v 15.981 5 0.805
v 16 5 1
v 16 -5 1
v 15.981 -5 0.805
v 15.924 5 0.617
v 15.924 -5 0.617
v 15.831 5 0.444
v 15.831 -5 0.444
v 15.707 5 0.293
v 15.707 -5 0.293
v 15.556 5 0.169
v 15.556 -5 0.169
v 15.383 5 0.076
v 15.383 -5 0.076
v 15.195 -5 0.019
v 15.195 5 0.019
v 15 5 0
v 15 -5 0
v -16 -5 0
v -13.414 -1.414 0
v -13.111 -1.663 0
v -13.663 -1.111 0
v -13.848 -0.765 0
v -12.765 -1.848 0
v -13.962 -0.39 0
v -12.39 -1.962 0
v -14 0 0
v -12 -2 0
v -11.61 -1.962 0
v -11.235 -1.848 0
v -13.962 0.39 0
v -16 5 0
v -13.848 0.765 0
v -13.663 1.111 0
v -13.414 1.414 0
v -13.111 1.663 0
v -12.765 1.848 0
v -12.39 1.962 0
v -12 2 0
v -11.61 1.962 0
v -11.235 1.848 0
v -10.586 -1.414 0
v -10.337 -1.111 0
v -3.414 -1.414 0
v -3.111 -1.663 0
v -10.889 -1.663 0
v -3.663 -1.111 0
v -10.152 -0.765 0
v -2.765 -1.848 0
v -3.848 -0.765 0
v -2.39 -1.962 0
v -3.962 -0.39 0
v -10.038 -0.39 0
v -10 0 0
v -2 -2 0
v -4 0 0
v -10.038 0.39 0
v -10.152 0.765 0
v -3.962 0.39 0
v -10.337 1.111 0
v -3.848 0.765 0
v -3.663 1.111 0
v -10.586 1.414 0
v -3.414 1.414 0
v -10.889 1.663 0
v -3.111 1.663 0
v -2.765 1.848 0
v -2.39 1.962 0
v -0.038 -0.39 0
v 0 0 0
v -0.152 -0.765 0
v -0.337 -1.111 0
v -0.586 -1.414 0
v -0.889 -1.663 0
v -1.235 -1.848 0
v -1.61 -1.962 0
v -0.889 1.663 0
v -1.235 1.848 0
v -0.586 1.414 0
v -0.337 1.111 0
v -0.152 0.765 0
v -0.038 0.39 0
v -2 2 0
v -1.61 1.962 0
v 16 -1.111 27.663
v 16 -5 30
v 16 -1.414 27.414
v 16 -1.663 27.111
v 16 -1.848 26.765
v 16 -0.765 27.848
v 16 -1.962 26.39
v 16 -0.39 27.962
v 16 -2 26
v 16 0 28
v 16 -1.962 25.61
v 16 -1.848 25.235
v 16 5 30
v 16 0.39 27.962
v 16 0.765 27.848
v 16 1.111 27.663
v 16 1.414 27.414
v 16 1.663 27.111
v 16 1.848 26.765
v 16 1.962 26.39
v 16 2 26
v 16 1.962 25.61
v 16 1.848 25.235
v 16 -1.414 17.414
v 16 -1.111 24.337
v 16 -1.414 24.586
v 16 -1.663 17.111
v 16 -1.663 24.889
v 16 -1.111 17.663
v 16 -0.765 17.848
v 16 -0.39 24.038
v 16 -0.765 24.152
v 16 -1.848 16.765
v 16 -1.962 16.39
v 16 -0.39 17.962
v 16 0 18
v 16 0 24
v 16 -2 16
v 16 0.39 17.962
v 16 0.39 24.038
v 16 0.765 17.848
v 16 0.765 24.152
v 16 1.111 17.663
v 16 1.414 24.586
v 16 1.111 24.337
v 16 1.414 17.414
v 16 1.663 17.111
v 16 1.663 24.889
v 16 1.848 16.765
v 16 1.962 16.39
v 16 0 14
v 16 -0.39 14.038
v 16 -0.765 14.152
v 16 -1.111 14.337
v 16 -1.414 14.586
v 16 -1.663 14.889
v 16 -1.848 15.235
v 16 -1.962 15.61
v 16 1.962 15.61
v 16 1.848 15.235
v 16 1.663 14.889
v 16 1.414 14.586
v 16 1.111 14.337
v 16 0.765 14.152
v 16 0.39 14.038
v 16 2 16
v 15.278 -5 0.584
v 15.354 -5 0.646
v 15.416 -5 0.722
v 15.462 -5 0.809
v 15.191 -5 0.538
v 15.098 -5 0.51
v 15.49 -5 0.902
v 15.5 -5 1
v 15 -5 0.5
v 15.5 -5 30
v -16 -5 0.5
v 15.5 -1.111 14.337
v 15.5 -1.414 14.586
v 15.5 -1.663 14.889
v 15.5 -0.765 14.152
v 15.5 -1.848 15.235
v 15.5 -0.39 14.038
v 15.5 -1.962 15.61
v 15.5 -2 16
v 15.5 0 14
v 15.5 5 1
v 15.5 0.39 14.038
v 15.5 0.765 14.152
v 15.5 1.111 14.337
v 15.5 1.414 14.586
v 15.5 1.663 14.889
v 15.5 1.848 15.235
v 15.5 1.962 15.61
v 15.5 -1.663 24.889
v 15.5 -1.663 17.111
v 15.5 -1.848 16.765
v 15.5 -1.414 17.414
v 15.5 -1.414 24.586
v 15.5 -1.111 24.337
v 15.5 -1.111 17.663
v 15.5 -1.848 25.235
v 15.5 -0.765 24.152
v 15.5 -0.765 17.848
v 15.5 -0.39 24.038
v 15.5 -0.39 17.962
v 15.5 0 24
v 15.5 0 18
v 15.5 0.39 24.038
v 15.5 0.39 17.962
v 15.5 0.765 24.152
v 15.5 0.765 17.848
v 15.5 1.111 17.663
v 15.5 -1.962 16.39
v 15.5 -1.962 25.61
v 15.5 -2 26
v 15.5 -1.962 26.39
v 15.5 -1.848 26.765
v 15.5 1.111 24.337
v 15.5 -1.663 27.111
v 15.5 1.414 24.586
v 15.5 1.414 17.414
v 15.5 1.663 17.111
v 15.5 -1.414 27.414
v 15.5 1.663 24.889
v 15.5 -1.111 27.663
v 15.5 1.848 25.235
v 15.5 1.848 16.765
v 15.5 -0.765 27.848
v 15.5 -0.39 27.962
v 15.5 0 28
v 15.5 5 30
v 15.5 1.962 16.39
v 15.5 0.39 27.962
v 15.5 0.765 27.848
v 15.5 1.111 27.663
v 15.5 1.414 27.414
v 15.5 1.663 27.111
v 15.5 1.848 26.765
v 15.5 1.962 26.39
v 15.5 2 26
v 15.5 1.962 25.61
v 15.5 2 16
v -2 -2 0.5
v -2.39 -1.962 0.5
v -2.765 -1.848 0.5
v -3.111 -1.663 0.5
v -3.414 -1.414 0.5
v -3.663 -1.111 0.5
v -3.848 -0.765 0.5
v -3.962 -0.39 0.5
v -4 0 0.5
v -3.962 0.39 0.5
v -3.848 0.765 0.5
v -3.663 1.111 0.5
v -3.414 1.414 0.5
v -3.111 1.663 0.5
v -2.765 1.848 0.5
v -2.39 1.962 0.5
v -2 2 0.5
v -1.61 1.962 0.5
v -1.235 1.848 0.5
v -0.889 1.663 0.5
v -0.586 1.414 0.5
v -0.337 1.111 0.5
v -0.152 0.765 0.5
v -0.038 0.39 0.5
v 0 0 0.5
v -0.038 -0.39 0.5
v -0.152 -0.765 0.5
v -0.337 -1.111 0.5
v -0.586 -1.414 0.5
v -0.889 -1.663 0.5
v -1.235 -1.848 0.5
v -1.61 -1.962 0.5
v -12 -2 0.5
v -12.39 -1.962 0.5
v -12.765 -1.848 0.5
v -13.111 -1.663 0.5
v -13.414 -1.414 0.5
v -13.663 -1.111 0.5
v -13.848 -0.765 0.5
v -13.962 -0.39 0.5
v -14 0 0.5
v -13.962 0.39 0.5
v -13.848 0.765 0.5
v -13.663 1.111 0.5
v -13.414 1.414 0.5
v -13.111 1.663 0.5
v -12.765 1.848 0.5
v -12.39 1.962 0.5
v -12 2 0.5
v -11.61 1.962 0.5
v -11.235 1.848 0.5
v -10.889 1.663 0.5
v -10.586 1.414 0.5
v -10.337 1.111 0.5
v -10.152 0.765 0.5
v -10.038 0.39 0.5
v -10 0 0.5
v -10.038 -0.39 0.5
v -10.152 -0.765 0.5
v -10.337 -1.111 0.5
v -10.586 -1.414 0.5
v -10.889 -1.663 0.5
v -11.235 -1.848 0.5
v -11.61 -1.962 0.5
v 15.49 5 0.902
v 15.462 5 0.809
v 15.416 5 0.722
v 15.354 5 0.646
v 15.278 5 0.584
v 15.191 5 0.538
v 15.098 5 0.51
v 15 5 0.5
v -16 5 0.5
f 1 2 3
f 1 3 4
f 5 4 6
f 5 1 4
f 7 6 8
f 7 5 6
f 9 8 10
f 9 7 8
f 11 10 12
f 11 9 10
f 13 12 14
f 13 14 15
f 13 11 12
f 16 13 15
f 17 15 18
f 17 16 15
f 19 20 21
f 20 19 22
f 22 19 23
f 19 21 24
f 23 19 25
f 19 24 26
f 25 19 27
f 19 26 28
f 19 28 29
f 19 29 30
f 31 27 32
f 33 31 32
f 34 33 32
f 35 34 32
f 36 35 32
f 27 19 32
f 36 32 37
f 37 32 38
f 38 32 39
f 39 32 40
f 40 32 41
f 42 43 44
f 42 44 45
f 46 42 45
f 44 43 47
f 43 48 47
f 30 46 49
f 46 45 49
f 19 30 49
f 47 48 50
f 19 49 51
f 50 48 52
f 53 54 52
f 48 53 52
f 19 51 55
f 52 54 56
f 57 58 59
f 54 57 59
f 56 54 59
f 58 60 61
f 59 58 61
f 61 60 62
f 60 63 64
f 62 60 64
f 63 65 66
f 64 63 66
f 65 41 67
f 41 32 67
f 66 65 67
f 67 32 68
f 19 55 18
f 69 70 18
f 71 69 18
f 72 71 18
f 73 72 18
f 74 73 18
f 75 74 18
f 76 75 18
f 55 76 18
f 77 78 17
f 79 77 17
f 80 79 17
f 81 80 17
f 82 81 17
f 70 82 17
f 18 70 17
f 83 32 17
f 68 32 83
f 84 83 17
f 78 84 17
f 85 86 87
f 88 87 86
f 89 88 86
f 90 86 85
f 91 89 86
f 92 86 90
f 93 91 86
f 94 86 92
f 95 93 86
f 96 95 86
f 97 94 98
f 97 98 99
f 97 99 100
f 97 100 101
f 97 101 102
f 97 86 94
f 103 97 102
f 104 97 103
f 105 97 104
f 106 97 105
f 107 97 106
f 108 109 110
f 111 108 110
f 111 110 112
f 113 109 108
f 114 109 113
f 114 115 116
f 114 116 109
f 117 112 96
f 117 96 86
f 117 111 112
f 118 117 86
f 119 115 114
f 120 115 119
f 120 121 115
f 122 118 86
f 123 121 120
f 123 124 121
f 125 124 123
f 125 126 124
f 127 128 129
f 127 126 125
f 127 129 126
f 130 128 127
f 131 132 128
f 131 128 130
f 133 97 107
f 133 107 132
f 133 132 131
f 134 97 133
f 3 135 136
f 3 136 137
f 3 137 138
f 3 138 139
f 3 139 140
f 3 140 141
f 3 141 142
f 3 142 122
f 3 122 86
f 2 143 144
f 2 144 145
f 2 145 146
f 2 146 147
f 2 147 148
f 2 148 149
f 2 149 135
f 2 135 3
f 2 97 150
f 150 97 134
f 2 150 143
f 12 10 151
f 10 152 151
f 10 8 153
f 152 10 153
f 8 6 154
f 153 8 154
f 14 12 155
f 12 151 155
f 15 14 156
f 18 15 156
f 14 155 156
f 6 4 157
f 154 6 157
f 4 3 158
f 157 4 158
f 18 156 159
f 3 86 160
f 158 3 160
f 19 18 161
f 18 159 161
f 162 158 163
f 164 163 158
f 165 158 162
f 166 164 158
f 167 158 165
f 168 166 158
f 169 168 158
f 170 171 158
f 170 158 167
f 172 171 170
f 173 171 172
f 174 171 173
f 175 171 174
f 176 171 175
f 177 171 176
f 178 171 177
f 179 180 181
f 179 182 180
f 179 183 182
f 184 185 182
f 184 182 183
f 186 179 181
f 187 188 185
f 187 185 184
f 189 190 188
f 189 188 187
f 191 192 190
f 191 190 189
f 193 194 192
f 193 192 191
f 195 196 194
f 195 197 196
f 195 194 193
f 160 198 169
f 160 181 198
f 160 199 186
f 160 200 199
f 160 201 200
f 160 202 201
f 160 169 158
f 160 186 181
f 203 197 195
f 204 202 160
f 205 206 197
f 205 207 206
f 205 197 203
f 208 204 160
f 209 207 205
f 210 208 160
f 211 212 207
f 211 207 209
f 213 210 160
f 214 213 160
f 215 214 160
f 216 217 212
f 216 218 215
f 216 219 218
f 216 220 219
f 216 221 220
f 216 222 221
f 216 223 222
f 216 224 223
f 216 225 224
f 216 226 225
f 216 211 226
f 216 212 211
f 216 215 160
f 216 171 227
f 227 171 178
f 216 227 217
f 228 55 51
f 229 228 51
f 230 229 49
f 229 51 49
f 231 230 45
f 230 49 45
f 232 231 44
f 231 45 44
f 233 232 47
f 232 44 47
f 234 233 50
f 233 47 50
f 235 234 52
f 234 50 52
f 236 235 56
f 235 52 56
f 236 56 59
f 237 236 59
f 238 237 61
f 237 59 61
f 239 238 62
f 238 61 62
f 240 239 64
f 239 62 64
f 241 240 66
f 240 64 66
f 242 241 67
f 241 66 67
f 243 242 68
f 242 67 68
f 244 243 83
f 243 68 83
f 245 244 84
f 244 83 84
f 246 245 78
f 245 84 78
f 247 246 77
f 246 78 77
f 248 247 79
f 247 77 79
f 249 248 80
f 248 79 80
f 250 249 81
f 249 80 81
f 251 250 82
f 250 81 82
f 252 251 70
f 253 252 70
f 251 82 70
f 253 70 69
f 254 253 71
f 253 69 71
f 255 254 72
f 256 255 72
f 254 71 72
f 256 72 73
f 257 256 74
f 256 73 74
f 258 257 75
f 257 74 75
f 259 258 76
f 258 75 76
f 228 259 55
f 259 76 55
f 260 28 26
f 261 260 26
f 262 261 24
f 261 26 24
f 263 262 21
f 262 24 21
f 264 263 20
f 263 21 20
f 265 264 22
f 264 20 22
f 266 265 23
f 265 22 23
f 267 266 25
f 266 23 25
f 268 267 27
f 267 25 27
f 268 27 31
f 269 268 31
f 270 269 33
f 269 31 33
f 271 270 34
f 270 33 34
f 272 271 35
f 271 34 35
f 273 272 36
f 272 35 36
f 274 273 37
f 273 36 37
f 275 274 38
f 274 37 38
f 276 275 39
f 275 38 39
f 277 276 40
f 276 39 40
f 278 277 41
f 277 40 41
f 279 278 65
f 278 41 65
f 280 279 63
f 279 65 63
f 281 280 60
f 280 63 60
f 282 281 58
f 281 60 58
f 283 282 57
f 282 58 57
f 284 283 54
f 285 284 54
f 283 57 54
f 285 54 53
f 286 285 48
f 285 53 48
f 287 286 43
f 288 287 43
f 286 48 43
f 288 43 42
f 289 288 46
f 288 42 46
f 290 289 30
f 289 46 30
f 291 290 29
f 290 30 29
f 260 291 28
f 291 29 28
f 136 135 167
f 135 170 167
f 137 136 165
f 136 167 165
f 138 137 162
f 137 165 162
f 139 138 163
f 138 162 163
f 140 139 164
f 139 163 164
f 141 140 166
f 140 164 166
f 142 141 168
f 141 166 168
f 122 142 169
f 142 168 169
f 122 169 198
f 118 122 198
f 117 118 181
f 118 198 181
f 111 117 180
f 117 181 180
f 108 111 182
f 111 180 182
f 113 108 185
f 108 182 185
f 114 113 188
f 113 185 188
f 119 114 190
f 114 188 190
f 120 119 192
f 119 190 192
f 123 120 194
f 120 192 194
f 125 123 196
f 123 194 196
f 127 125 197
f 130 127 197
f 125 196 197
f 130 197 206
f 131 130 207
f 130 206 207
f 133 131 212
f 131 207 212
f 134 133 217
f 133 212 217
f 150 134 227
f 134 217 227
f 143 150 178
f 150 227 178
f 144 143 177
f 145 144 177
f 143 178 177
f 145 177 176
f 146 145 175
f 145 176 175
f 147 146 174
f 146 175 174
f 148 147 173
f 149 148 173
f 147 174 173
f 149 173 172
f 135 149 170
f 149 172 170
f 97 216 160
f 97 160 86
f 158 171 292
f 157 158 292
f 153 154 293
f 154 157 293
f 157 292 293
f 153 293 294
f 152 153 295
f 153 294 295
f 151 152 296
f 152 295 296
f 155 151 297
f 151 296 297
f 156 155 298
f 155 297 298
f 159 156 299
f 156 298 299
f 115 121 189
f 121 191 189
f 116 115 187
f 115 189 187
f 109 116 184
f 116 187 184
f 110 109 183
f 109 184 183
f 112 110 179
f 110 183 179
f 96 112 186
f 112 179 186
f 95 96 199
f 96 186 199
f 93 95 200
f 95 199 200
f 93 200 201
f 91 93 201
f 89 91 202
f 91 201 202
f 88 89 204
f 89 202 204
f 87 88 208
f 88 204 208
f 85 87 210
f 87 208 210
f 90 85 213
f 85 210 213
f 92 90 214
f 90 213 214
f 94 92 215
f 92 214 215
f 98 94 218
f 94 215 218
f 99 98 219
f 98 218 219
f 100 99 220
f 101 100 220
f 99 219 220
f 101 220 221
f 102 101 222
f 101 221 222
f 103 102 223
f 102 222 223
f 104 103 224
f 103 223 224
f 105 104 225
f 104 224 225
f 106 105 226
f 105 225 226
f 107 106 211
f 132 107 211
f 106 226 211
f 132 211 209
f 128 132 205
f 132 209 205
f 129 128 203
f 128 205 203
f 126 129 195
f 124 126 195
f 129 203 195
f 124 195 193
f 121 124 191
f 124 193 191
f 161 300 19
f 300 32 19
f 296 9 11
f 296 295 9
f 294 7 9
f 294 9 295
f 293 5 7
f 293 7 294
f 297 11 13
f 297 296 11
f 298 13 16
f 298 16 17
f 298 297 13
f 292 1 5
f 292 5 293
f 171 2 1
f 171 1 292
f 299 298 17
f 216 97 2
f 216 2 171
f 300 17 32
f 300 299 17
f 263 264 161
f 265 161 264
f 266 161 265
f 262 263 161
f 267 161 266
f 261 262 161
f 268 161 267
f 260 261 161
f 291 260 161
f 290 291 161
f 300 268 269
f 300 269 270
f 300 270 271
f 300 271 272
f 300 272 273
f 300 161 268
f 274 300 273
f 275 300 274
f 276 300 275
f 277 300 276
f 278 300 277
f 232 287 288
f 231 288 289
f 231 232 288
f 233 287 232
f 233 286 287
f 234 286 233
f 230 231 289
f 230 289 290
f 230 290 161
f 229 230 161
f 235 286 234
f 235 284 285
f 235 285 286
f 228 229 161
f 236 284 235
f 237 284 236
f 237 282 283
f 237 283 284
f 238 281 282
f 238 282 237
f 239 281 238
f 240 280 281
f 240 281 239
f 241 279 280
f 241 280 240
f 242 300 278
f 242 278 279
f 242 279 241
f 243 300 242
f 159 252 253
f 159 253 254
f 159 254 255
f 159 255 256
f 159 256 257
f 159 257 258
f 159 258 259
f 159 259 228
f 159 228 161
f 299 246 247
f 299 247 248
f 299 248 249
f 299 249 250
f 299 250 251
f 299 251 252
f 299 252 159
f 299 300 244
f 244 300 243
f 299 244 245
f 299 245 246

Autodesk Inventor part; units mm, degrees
ref_plane "YZ Plane" through (0, 0, 0) normal (1, 0, 0) x (0, 1, 0)
ref_plane "XZ Plane" through (0, 0, 0) normal (0, 1, 0) x (-1, 0, 0)
ref_plane "XY Plane" through (0, 0, 0) normal (0, 0, 1) x (1, 0, 0)
sketch "Sketch1" plane through (0, 0, 0) normal (0, 0, 1) x (1, 0, 0)
  line L0 (-16, -5) -> (16, -5)
  line L1 (16, -5) -> (16, 5)
  line L2 (16, 5) -> (-16, 5)
  line L3 (-16, 5) -> (-16, -5)
  line L4 (-16, -5) -> (16, 5) construction
  line L5 (16, -5) -> (-16, 5) construction
  point P0 (0, 0)
  dimension "d0" = 32
  dimension "d1" = 10
extrude "Plate1" add sketch "Sketch1" along normal blind 0.5
sketch "Sketch2" plane through (15.5, 5, 0) normal (1, 0, 0) x (0, 1, 0)
  line L0 (-10, 0) -> (0, 0)
  line L1 (0, 0) -> (0, 30)
  line L2 (0, 30) -> (-10, 30)
  line L3 (-10, 30) -> (-10, 0)
edge flange "Flange1" height 30 angle 90 thickness 0.5 bend radius 0.5 thickness toward (1, 0, 0) relief tear relief width 0.5 relief depth 0.25 edges at (16, 0, 0.5) wall of the first edge with corners at (15.5, -5, 0) (15.5, 5, 0) (15.5, 5, 30) (15.5, -5, 30)
bend "Bend1"
corner "Corner1"
sketch "Sketch4" plane through (0, 0, 0.5) normal (0, 0, 1) x (1, 0, 0)
  line L0 (-16, -5) -> (-16, 5) projected
  point P0 (0, 0)
  point P1 (-12, 0)
  point P2 (-2, 0)
  dimension "d13" = 4
  dimension "d14" = 14
hole "Hole1" at (-12, 0, 0.5) at (-2, 0, 0.5) direction (0, 0, -1) diameter 4 end through all
sketch "Sketch5" plane through (16, -5, 30) normal (1, 0, 0) x (0, 0, -1)
  line L0 (0, 0) -> (0, 10) projected
  point P0 (30, 5)
  point P1 (4, 5)
  point P2 (14, 5)
  dimension "d22" = 4
  dimension "d23" = 14
hole "Hole2" at (16, 0, 26) at (16, 0, 16) direction (-1, 0, 0) diameter 4 end through all
equation "\"d20\" = Thickness"
equation "\"d29\" = Thickness"
equation "\"d3\" = BendReliefWidth"
equation "\"d4\" = BendReliefDepth"
equation "\"d5\" = MinimumRemnant"
equation "\"d6\" = BendRadius"
equation "\"d9\" = BendRadius"
equation "\"d10\" = CornerReliefSize"
equation "\"d11\" = GapSize"
equation "\"d12\" = JacobiRadiusSize"
equation "\"BendRadius\" = Thickness"
equation "\"BendReliefWidth\" = Thickness"
equation "\"BendReliefDepth\" = 0.5 * Thickness"
equation "\"CornerReliefSize\" = 4 * Thickness"
equation "\"MinimumRemnant\" = 2 * Thickness"
equation "\"TransitionRadius\" = BendRadius"
equation "\"JacobiRadiusSize\" = BendRadius"
equation "\"GapSize\" = Thickness"
equation "\"d2\" = BendRadius"
equation "\"Thickness\" = 0.5"
properties part number "maker-beam-corner"
